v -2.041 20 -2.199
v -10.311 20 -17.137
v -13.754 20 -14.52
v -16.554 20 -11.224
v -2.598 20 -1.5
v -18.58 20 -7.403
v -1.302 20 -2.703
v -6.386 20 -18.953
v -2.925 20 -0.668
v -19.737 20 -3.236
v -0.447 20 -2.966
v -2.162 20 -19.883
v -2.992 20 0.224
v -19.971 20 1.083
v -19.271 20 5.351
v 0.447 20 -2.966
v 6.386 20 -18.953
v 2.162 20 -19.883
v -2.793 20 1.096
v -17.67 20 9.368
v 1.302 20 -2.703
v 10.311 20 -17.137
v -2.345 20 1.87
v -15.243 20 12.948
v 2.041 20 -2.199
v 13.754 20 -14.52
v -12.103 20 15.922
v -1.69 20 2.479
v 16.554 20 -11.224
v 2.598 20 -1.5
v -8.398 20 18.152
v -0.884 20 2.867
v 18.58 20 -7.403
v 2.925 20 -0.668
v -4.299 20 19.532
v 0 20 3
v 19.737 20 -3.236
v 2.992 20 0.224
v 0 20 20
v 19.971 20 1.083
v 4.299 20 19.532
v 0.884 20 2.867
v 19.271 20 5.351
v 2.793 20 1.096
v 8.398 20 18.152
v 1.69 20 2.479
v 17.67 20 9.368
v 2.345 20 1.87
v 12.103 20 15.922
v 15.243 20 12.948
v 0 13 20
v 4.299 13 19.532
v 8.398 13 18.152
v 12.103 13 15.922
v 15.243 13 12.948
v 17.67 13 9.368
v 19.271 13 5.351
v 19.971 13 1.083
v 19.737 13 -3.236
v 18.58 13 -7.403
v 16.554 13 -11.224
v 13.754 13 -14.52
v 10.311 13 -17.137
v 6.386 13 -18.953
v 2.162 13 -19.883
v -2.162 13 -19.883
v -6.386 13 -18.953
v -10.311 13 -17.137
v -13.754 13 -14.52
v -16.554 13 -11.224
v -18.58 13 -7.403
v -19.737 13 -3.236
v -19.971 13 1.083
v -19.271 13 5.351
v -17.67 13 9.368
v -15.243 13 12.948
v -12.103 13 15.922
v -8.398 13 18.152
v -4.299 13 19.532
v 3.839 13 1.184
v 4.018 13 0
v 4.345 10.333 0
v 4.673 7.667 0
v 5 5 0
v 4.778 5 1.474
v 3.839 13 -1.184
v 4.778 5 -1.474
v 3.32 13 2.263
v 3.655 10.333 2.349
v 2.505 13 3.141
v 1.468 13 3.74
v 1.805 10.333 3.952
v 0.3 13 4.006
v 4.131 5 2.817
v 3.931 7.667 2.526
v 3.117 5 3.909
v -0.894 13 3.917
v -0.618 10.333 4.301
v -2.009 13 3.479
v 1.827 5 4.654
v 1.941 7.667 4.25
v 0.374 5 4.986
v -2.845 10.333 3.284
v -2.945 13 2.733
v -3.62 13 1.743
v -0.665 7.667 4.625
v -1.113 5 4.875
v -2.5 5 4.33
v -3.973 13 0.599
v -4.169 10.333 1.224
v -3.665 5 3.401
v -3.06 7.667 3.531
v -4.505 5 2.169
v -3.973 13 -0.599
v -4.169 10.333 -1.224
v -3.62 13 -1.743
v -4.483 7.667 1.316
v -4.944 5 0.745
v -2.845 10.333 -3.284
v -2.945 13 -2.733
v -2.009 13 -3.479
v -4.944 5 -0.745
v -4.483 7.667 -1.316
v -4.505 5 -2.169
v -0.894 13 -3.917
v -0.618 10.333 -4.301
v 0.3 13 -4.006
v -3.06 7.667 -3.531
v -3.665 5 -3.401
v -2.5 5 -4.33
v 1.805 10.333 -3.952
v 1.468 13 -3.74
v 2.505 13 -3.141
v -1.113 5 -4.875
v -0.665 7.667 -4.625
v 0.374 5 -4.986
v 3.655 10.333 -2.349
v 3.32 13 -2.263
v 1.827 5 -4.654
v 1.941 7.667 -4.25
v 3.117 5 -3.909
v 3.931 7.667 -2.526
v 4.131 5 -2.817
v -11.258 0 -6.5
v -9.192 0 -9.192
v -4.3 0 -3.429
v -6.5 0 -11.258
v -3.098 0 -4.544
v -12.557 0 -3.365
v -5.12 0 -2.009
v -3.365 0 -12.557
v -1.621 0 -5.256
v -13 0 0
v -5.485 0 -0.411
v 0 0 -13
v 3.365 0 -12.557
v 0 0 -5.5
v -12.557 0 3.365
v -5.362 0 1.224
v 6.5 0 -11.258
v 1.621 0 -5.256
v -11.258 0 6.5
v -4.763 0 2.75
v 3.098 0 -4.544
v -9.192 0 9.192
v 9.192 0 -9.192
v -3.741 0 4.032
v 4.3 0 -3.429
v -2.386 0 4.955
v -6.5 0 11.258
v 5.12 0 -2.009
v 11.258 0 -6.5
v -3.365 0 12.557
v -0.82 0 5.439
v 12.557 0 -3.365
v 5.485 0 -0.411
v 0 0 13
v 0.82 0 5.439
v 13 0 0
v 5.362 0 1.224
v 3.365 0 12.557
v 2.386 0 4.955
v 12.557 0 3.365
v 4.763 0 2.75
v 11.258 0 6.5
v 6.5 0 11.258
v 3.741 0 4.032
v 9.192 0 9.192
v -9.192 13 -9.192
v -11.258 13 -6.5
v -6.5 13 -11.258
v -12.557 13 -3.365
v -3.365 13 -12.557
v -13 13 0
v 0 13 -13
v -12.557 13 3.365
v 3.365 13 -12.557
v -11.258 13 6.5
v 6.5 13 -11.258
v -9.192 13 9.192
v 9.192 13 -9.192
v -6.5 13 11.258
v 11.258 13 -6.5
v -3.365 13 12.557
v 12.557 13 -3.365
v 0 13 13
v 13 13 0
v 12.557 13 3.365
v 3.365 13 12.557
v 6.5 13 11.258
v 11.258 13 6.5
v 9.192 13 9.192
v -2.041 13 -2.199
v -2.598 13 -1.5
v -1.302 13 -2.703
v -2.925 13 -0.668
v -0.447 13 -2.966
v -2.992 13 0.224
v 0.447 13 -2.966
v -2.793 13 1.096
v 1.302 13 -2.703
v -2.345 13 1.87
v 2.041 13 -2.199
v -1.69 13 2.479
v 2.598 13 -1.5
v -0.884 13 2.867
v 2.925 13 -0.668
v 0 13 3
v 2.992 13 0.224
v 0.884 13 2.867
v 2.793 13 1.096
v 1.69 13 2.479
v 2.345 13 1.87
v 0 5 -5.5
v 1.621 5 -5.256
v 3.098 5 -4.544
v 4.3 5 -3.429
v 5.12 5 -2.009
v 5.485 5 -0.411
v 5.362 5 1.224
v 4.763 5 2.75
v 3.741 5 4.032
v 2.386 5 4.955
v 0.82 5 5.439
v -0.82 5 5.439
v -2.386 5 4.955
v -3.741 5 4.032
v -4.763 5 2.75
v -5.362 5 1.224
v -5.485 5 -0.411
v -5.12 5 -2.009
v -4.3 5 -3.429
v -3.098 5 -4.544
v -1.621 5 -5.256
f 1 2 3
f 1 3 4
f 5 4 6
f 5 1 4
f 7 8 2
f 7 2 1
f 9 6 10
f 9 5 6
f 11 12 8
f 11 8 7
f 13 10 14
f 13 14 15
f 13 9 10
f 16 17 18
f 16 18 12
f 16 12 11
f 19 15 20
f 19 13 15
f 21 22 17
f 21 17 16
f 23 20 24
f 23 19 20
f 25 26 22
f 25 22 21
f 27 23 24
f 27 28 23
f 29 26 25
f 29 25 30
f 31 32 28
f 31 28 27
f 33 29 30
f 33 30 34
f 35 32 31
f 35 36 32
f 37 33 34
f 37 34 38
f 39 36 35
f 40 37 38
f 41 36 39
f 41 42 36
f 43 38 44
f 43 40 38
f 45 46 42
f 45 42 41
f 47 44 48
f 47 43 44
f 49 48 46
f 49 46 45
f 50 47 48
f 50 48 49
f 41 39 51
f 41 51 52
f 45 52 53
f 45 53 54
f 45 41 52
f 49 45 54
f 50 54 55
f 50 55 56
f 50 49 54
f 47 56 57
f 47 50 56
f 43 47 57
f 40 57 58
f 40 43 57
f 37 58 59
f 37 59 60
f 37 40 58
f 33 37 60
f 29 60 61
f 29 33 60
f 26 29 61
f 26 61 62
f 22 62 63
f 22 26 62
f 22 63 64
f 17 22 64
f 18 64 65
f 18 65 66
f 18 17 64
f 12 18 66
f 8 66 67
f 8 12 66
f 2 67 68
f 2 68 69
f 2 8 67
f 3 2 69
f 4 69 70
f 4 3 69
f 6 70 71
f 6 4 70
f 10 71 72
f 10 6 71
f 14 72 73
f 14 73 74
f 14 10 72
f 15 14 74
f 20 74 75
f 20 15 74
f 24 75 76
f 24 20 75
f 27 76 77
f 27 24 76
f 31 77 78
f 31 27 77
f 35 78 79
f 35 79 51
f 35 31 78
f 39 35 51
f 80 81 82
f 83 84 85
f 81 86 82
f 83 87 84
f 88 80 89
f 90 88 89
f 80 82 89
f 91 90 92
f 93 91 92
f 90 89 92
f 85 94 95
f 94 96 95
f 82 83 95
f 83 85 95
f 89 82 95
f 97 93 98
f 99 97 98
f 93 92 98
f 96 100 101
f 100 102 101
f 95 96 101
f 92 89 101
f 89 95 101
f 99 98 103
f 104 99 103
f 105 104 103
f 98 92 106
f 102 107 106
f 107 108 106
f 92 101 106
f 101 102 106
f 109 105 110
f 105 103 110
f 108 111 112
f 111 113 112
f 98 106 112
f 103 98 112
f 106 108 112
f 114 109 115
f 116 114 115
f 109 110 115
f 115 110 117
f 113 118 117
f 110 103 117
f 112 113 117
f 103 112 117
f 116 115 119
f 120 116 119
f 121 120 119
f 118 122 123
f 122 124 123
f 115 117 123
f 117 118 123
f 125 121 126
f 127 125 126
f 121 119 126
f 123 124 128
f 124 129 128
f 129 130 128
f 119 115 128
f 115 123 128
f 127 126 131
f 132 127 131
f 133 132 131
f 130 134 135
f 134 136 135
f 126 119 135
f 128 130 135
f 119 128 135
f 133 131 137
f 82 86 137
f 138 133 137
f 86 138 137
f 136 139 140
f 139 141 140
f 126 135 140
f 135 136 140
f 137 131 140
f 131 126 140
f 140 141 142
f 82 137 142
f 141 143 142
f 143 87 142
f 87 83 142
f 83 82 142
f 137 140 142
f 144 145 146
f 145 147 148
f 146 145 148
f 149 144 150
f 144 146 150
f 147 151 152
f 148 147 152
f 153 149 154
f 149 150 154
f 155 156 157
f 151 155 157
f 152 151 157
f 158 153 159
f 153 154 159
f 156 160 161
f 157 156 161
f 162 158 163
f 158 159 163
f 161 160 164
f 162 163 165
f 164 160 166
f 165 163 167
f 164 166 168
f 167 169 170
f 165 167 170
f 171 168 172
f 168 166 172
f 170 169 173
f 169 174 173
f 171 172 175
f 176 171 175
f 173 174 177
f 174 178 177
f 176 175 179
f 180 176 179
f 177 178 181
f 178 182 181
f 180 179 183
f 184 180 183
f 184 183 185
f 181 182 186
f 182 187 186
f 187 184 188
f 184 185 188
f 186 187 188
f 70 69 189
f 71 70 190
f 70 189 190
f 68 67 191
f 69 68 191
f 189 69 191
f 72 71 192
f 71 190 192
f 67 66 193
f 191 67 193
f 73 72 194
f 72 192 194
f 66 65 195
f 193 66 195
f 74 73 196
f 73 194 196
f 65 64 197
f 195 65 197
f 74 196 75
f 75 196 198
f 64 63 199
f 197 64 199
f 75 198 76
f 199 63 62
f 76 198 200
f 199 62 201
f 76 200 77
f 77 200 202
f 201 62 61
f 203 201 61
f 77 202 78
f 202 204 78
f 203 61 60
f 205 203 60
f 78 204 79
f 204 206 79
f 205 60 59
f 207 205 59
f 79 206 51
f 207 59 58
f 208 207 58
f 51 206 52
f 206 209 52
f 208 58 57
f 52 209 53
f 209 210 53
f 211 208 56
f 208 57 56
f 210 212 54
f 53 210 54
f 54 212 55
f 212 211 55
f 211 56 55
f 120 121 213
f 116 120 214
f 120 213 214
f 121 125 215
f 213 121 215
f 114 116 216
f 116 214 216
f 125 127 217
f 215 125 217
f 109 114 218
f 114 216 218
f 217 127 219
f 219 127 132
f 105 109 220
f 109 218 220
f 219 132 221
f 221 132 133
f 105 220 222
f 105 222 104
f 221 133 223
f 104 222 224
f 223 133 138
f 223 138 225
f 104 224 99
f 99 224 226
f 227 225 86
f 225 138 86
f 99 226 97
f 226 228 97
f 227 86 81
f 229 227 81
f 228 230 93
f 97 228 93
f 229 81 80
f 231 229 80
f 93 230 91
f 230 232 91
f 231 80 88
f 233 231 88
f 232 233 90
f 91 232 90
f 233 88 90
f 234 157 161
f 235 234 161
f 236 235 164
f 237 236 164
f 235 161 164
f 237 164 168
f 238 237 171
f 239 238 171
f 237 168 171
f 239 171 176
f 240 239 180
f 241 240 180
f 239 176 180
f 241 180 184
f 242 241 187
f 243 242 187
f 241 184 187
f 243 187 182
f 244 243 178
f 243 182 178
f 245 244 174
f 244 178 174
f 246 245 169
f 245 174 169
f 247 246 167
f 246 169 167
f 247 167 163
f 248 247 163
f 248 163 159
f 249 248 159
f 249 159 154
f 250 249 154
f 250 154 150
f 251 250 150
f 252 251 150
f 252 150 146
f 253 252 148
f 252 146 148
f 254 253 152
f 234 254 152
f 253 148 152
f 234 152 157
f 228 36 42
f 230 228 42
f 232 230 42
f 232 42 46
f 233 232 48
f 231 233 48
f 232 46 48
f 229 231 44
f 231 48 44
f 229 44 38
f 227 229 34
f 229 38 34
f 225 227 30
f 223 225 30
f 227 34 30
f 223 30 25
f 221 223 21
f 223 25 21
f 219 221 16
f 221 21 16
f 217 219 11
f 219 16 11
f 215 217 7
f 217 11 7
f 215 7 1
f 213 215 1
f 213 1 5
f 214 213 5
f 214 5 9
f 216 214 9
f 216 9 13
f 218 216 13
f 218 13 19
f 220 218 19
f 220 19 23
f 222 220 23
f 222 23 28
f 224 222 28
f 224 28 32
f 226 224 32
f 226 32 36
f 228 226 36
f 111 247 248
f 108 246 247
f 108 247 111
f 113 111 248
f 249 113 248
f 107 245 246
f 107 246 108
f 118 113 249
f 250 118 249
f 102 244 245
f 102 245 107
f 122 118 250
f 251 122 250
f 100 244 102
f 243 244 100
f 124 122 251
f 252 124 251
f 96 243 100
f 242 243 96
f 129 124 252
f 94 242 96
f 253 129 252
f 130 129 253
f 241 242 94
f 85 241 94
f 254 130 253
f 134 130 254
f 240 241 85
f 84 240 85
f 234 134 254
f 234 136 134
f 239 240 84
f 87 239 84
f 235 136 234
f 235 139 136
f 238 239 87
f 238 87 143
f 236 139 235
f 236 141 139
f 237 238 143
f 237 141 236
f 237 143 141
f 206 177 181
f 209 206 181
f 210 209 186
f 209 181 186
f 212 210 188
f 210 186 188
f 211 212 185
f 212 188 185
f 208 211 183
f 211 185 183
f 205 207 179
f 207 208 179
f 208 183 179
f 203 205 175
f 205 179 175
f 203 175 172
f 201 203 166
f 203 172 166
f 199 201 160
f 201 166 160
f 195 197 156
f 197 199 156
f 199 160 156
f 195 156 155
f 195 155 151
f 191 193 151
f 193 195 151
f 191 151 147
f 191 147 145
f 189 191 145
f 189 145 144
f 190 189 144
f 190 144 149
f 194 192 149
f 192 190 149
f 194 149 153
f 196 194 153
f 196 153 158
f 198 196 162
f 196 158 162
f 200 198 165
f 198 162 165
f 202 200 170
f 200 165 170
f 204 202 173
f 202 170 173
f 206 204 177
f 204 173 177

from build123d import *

# Parameters (mm, degrees)
SKETCH_1_R          = 13
EXTRUDE_1_DEPTH     = 20
SKETCH_2_R          = 5.5
CUT_EXTRUDE_2_DEPTH = 5
SKETCH_3_R          = 5
CUT_EXTRUDE_3_DEPTH = 10
CUT_EXTRUDE_3_DRAFT = -7
SKETCH_5_R          = 20
EXTRUDE_7_DEPTH     = 7
SKETCH_7_R          = 3
CUT_EXTRUDE_8_DEPTH = 35.641016151


with BuildPart() as part:
    # Эскиз1 → Вытянуть1 (new body)
    with BuildSketch(Plane(origin=(0, 0, 0), x_dir=(1, 0, 0), z_dir=(0, 1, 0))):
        with Locations(Location((0, 0, 0), (0, 0, 270))):
            Circle(SKETCH_1_R)
    extrude(amount=EXTRUDE_1_DEPTH)

    # Эскиз2 → Вытянуть2 (cut)
    with BuildSketch(Plane.XZ):
        with Locations(Location((0, 0, 0), (0, 0, 270))):
            Circle(SKETCH_2_R)
    extrude(amount=-CUT_EXTRUDE_2_DEPTH, mode=Mode.SUBTRACT)


with BuildPart() as cut_extrude_3_tool:
    # Эскиз3 → Вытянуть3 (with draft: the straight prism first)
    with BuildSketch(Plane.XZ.offset(-5)):
        Circle(SKETCH_3_R)
    extrude(amount=-CUT_EXTRUDE_3_DEPTH)
    # Вытянуть3: the draft: its side faces are tilted about the plane it starts from
    cut_extrude_3_sides = [cut_extrude_3_tool.faces().sort_by_distance(p)[0] for p in [
        (-5, 10, 0),
    ]]
    draft(cut_extrude_3_sides, Plane.XZ.offset(-5), CUT_EXTRUDE_3_DRAFT)


with BuildPart() as part_1:
    add(part.part)

    # Вытянуть3: cut by cut_extrude_3_tool
    add(cut_extrude_3_tool.part, mode=Mode.SUBTRACT)

    # Эскиз5 → Вытянуть7 (add)
    with BuildSketch(Plane(origin=(0, 20, 0), x_dir=(-1, 0, 0), z_dir=(0, 1, 0))):
        with Locations(Location((0, 0, 0), (0, 0, 90))):
            Circle(SKETCH_5_R)
    extrude(amount=-EXTRUDE_7_DEPTH)

    # Эскиз7 → Вытянуть8 (cut, through all)
    with BuildSketch(Plane(origin=(0, 20, 0), x_dir=(1, 0, 0), z_dir=(0, 1, 0))):
        with Locations(Location((0, 0, 0), (0, 0, 270))):
            Circle(SKETCH_7_R)
    extrude(amount=-CUT_EXTRUDE_8_DEPTH, mode=Mode.SUBTRACT)


solid = part_1.part
